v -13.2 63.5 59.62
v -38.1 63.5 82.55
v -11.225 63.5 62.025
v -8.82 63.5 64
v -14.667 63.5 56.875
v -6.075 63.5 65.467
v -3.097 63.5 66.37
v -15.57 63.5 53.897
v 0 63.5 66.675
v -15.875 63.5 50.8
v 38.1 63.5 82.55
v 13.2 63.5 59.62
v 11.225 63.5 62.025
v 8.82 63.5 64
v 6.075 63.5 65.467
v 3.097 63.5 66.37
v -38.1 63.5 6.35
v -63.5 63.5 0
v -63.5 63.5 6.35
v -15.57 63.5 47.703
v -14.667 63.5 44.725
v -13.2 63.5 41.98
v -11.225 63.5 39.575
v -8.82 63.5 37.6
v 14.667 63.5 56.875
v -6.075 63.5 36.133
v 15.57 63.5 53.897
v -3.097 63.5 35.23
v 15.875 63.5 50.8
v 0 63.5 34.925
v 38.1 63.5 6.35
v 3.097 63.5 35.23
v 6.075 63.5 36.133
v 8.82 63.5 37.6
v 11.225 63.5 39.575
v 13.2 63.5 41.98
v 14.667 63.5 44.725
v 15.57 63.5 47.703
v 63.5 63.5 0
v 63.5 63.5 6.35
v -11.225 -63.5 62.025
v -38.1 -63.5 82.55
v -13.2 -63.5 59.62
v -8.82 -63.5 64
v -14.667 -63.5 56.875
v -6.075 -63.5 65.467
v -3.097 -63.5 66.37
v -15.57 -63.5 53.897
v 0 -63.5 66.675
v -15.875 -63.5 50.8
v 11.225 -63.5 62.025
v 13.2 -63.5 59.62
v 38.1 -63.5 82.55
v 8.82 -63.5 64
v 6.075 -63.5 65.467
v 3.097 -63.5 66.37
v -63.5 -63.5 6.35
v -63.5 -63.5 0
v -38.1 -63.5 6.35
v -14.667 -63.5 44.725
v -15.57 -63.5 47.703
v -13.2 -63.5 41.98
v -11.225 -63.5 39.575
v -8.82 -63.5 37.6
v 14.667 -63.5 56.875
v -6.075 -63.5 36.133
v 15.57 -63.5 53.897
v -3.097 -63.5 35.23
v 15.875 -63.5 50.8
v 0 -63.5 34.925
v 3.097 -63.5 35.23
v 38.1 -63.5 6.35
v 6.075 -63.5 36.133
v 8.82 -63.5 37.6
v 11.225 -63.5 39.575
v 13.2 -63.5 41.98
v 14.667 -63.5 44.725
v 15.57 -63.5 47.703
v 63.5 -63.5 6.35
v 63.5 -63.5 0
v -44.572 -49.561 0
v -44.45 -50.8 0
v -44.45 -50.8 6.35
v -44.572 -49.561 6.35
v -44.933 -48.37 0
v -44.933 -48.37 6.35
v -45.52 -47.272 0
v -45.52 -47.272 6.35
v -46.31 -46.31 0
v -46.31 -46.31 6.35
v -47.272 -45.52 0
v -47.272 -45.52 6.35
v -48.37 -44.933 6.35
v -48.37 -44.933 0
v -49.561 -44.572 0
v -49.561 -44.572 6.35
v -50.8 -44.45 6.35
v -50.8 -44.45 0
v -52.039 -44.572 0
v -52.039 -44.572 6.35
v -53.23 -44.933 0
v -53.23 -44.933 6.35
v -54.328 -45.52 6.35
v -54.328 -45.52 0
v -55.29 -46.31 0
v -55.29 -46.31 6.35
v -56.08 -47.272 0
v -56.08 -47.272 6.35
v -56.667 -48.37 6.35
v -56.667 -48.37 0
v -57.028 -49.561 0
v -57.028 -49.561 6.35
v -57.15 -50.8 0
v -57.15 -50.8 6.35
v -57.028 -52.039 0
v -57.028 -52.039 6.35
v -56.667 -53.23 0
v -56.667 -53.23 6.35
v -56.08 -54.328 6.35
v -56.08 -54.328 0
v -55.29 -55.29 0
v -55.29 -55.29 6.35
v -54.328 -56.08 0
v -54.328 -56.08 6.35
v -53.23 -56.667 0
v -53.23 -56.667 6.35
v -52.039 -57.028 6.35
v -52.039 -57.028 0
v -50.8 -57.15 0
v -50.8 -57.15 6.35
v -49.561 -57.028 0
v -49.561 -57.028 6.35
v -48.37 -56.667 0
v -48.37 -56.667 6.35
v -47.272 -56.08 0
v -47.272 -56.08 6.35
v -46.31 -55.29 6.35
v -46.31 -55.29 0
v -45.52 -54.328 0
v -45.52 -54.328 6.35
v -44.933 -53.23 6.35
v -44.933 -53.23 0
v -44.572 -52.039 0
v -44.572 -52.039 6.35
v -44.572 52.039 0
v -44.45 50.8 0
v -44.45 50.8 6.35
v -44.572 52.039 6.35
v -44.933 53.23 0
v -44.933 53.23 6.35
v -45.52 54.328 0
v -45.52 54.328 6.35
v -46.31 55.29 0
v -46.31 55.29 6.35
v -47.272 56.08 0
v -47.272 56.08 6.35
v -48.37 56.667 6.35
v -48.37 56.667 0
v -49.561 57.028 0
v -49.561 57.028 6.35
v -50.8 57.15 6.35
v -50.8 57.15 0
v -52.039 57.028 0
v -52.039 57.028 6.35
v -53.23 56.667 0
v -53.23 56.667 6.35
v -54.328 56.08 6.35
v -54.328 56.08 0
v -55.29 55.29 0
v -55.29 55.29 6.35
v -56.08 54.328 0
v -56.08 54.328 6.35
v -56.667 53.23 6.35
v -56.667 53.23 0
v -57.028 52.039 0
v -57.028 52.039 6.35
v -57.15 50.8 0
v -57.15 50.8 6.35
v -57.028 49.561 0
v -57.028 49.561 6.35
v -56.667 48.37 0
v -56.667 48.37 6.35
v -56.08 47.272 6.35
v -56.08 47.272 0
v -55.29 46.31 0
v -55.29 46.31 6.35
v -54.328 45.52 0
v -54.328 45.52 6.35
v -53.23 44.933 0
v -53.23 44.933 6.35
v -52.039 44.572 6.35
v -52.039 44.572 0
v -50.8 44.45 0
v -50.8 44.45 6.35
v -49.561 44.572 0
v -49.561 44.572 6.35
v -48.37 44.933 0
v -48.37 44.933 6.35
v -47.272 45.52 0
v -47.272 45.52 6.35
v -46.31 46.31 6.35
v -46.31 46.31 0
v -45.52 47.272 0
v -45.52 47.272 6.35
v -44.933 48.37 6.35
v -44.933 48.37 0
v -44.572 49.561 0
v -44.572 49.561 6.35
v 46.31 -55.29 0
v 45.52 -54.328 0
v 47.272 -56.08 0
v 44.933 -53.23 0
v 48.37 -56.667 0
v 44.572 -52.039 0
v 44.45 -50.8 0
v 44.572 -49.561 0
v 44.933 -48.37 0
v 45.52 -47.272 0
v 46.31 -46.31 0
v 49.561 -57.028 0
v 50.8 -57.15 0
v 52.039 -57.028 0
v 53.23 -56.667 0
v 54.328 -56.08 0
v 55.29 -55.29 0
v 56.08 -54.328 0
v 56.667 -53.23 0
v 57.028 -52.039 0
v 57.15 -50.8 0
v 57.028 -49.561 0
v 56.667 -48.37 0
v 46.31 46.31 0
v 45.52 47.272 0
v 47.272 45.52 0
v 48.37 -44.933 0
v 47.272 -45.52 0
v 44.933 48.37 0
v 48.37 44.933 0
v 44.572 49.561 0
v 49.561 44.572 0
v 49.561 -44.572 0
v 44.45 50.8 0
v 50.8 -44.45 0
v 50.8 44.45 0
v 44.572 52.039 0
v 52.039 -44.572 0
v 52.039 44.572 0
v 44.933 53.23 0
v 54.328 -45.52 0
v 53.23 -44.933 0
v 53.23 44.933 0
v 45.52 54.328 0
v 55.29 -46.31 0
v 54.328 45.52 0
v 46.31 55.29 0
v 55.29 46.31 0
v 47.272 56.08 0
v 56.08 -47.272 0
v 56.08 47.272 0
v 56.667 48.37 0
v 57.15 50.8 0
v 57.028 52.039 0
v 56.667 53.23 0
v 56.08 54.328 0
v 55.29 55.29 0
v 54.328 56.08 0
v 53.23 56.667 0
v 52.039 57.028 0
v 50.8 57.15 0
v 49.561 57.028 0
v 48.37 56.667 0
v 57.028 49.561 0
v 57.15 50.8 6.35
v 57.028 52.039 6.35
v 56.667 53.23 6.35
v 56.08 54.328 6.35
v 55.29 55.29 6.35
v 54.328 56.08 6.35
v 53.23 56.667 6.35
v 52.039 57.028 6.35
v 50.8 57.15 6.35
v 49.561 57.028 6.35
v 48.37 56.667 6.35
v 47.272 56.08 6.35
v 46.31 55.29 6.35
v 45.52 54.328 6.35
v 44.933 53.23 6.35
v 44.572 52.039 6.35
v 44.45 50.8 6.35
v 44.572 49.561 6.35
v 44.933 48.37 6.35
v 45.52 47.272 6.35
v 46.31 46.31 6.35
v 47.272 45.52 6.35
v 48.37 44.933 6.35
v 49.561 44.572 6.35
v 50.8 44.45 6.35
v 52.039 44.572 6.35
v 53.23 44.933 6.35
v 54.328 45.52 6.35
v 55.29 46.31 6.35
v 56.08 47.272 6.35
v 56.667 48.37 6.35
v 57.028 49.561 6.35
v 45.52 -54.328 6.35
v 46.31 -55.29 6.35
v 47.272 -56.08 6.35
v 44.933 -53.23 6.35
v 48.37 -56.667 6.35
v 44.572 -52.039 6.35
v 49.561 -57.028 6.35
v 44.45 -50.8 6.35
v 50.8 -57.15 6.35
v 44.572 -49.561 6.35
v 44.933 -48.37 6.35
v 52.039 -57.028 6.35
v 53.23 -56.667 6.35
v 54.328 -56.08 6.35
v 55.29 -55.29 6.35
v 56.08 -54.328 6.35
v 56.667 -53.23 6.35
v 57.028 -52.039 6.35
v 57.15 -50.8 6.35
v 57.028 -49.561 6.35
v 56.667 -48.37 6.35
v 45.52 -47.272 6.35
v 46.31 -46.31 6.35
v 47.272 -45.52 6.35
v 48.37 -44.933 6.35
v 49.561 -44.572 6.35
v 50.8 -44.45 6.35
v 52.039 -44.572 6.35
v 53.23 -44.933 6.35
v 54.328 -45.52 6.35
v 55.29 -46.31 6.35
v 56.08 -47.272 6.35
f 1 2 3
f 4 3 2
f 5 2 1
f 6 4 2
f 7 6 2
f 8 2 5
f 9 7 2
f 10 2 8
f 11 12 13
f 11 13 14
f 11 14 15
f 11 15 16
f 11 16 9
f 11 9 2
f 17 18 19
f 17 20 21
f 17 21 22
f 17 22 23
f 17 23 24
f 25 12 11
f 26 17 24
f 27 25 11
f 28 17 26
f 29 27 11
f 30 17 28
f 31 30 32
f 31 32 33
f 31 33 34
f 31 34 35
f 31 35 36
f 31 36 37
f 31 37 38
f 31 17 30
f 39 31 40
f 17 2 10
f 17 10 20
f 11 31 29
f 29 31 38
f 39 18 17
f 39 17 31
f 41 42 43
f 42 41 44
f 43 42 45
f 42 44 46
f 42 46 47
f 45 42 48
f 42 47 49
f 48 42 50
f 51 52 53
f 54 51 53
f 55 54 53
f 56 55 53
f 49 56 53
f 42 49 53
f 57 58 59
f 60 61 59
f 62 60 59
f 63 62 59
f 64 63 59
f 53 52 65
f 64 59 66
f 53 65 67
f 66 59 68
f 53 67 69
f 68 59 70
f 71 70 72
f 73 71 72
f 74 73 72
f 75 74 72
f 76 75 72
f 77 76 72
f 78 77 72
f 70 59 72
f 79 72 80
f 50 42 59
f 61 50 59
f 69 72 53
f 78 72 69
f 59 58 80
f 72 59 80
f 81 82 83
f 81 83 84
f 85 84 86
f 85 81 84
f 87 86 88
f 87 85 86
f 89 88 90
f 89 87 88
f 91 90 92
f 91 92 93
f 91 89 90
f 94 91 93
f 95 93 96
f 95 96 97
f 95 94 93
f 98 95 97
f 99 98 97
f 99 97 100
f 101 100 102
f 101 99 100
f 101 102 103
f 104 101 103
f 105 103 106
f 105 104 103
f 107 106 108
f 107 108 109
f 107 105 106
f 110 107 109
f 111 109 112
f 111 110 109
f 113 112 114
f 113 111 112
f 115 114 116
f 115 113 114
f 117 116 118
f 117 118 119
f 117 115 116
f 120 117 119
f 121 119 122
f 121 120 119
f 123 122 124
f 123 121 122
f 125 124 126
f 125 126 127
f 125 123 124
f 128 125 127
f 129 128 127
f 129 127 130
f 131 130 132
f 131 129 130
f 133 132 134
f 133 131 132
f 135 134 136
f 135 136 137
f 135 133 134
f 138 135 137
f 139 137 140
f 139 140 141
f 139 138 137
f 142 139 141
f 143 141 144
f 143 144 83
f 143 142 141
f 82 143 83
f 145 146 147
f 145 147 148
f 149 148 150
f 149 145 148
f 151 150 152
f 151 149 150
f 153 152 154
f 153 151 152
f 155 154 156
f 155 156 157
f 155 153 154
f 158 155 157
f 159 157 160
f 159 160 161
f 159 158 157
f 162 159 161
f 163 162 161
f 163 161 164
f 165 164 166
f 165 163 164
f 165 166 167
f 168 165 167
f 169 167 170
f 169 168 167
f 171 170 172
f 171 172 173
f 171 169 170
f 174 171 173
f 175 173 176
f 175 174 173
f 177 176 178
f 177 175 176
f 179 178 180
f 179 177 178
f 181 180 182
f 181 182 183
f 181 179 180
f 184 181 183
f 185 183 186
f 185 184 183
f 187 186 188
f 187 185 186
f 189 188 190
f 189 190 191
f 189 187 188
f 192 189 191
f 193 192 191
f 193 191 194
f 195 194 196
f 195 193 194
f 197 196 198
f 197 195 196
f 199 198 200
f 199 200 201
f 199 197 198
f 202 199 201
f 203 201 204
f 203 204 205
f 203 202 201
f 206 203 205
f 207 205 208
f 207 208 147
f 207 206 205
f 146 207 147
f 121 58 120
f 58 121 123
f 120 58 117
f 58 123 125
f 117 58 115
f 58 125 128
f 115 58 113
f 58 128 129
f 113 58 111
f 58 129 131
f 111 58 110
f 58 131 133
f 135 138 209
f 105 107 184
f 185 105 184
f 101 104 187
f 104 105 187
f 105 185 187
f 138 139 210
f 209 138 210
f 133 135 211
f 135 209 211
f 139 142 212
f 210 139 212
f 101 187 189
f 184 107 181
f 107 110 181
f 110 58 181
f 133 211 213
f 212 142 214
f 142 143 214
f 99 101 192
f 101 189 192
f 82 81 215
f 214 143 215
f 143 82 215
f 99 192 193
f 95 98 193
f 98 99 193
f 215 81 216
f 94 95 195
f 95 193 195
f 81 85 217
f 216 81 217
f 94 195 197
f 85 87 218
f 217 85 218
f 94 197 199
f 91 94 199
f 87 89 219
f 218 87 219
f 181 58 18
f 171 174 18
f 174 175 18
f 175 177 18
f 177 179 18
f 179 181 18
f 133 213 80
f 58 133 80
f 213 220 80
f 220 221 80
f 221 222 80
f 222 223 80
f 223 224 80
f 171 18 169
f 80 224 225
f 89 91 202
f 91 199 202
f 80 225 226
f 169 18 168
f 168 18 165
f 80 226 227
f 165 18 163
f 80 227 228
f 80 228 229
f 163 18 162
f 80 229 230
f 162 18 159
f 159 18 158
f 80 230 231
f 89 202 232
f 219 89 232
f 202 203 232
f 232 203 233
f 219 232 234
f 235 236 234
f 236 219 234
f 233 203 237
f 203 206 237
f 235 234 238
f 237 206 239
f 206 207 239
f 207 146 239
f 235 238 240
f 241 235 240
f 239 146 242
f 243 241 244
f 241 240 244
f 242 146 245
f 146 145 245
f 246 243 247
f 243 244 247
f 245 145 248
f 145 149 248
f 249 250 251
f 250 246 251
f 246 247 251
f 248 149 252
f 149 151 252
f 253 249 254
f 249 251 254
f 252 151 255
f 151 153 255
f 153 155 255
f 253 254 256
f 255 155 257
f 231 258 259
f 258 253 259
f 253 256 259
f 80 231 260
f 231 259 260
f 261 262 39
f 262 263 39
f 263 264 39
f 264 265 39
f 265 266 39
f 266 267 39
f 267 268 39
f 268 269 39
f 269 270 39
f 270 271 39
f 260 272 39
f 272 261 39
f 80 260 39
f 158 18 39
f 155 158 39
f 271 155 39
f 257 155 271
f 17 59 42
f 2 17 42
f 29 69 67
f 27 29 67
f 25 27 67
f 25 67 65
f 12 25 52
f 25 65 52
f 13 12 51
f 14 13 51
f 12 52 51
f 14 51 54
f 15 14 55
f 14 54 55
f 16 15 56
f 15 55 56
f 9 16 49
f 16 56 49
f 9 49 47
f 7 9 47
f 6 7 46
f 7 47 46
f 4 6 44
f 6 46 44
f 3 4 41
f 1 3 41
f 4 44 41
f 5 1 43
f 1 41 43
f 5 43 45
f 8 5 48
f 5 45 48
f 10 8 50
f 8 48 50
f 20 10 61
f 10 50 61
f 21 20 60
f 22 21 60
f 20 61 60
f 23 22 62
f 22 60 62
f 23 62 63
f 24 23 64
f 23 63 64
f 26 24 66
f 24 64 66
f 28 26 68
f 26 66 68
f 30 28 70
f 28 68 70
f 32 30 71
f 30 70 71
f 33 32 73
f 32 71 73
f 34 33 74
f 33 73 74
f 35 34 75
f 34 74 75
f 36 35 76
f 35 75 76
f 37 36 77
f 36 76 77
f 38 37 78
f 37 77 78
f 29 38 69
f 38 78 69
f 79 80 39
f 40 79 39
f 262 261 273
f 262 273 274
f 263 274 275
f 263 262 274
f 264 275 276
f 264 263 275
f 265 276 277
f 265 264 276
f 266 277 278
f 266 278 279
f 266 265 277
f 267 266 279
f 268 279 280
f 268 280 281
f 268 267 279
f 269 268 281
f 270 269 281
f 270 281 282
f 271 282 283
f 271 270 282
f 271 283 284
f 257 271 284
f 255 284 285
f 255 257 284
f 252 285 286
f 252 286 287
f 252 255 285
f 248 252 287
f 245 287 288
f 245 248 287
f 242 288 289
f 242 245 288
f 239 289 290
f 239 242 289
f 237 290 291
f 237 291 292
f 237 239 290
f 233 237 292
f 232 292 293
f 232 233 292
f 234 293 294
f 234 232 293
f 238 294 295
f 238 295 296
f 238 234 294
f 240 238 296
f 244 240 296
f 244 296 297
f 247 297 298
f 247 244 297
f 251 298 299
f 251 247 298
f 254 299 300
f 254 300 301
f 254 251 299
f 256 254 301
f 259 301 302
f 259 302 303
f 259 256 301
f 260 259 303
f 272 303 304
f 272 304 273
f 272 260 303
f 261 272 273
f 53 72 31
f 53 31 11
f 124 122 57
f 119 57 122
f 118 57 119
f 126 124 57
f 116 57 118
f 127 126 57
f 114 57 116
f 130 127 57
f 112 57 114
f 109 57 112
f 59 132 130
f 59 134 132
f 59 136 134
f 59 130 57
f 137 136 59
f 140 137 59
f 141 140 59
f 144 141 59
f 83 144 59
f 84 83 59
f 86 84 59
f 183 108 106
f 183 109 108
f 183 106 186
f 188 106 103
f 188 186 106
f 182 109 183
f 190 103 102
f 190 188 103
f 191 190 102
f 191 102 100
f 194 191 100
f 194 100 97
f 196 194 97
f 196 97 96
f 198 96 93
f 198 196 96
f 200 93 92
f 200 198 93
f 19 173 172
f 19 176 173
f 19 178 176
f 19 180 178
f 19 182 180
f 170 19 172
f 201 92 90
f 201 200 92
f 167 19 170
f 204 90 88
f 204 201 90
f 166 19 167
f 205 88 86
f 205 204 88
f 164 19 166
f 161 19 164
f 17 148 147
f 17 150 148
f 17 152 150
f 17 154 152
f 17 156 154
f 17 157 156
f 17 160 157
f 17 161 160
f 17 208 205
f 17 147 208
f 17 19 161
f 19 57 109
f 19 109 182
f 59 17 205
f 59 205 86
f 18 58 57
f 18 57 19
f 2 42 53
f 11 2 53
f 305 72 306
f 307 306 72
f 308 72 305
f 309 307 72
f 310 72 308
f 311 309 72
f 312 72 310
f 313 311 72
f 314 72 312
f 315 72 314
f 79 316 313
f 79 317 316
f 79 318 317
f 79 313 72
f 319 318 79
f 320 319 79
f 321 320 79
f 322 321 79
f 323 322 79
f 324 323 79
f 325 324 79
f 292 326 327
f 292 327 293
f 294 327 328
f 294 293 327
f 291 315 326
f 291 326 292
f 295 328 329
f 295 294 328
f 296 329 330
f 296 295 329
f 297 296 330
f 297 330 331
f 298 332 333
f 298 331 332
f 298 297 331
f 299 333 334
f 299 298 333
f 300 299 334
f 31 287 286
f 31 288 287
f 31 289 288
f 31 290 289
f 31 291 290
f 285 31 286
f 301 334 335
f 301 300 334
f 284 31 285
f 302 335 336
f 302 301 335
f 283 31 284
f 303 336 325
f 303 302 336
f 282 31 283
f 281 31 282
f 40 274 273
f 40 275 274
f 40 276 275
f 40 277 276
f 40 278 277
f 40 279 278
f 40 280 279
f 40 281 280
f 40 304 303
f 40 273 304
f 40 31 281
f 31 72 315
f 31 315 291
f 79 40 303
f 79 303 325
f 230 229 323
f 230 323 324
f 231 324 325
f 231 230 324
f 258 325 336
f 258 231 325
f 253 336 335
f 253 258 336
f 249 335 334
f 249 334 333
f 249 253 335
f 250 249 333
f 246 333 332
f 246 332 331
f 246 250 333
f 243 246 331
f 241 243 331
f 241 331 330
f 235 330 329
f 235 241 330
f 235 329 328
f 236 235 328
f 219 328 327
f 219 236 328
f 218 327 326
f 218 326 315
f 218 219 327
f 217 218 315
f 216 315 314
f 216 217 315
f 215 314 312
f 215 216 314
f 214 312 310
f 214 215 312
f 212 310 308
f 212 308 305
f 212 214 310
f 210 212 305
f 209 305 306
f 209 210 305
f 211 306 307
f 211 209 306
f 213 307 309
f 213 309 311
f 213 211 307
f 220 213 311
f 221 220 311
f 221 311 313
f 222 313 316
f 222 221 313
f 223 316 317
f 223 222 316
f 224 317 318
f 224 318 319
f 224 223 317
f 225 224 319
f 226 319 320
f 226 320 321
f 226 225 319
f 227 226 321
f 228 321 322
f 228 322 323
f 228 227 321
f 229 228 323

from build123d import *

# Parameters (mm, degrees)
F0_W     = 127
F0_H     = 127
F0_R     = 6.35
F1_DEPTH = 6.35
F2_W     = 76.2
F2_H     = 76.2
F2_R     = 15.875
F3_DEPTH = 127


with BuildPart() as f1:
    # F0 (on Top) → F1 (new body)
    with BuildSketch(Plane.XY):
        Rectangle(F0_W, F0_H)
        with Locations((-50.8, -50.8)):
            Circle(F0_R, mode=Mode.SUBTRACT)
        with Locations((50.8, -50.8)):
            Circle(F0_R, mode=Mode.SUBTRACT)
        with Locations((-50.8, 50.8)):
            Circle(F0_R, mode=Mode.SUBTRACT)
        with Locations((50.8, 50.8)):
            Circle(F0_R, mode=Mode.SUBTRACT)
    extrude(amount=F1_DEPTH)

    # F2 (on face) → F3 (join, through all)
    with BuildSketch(Plane.XZ.offset(63.5)):
        with Locations((0, 44.45)):
            Rectangle(F2_W, F2_H)
        with Locations((0, 50.8)):
            Circle(F2_R, mode=Mode.SUBTRACT)
    extrude(amount=-F3_DEPTH)


solid = f1.part
